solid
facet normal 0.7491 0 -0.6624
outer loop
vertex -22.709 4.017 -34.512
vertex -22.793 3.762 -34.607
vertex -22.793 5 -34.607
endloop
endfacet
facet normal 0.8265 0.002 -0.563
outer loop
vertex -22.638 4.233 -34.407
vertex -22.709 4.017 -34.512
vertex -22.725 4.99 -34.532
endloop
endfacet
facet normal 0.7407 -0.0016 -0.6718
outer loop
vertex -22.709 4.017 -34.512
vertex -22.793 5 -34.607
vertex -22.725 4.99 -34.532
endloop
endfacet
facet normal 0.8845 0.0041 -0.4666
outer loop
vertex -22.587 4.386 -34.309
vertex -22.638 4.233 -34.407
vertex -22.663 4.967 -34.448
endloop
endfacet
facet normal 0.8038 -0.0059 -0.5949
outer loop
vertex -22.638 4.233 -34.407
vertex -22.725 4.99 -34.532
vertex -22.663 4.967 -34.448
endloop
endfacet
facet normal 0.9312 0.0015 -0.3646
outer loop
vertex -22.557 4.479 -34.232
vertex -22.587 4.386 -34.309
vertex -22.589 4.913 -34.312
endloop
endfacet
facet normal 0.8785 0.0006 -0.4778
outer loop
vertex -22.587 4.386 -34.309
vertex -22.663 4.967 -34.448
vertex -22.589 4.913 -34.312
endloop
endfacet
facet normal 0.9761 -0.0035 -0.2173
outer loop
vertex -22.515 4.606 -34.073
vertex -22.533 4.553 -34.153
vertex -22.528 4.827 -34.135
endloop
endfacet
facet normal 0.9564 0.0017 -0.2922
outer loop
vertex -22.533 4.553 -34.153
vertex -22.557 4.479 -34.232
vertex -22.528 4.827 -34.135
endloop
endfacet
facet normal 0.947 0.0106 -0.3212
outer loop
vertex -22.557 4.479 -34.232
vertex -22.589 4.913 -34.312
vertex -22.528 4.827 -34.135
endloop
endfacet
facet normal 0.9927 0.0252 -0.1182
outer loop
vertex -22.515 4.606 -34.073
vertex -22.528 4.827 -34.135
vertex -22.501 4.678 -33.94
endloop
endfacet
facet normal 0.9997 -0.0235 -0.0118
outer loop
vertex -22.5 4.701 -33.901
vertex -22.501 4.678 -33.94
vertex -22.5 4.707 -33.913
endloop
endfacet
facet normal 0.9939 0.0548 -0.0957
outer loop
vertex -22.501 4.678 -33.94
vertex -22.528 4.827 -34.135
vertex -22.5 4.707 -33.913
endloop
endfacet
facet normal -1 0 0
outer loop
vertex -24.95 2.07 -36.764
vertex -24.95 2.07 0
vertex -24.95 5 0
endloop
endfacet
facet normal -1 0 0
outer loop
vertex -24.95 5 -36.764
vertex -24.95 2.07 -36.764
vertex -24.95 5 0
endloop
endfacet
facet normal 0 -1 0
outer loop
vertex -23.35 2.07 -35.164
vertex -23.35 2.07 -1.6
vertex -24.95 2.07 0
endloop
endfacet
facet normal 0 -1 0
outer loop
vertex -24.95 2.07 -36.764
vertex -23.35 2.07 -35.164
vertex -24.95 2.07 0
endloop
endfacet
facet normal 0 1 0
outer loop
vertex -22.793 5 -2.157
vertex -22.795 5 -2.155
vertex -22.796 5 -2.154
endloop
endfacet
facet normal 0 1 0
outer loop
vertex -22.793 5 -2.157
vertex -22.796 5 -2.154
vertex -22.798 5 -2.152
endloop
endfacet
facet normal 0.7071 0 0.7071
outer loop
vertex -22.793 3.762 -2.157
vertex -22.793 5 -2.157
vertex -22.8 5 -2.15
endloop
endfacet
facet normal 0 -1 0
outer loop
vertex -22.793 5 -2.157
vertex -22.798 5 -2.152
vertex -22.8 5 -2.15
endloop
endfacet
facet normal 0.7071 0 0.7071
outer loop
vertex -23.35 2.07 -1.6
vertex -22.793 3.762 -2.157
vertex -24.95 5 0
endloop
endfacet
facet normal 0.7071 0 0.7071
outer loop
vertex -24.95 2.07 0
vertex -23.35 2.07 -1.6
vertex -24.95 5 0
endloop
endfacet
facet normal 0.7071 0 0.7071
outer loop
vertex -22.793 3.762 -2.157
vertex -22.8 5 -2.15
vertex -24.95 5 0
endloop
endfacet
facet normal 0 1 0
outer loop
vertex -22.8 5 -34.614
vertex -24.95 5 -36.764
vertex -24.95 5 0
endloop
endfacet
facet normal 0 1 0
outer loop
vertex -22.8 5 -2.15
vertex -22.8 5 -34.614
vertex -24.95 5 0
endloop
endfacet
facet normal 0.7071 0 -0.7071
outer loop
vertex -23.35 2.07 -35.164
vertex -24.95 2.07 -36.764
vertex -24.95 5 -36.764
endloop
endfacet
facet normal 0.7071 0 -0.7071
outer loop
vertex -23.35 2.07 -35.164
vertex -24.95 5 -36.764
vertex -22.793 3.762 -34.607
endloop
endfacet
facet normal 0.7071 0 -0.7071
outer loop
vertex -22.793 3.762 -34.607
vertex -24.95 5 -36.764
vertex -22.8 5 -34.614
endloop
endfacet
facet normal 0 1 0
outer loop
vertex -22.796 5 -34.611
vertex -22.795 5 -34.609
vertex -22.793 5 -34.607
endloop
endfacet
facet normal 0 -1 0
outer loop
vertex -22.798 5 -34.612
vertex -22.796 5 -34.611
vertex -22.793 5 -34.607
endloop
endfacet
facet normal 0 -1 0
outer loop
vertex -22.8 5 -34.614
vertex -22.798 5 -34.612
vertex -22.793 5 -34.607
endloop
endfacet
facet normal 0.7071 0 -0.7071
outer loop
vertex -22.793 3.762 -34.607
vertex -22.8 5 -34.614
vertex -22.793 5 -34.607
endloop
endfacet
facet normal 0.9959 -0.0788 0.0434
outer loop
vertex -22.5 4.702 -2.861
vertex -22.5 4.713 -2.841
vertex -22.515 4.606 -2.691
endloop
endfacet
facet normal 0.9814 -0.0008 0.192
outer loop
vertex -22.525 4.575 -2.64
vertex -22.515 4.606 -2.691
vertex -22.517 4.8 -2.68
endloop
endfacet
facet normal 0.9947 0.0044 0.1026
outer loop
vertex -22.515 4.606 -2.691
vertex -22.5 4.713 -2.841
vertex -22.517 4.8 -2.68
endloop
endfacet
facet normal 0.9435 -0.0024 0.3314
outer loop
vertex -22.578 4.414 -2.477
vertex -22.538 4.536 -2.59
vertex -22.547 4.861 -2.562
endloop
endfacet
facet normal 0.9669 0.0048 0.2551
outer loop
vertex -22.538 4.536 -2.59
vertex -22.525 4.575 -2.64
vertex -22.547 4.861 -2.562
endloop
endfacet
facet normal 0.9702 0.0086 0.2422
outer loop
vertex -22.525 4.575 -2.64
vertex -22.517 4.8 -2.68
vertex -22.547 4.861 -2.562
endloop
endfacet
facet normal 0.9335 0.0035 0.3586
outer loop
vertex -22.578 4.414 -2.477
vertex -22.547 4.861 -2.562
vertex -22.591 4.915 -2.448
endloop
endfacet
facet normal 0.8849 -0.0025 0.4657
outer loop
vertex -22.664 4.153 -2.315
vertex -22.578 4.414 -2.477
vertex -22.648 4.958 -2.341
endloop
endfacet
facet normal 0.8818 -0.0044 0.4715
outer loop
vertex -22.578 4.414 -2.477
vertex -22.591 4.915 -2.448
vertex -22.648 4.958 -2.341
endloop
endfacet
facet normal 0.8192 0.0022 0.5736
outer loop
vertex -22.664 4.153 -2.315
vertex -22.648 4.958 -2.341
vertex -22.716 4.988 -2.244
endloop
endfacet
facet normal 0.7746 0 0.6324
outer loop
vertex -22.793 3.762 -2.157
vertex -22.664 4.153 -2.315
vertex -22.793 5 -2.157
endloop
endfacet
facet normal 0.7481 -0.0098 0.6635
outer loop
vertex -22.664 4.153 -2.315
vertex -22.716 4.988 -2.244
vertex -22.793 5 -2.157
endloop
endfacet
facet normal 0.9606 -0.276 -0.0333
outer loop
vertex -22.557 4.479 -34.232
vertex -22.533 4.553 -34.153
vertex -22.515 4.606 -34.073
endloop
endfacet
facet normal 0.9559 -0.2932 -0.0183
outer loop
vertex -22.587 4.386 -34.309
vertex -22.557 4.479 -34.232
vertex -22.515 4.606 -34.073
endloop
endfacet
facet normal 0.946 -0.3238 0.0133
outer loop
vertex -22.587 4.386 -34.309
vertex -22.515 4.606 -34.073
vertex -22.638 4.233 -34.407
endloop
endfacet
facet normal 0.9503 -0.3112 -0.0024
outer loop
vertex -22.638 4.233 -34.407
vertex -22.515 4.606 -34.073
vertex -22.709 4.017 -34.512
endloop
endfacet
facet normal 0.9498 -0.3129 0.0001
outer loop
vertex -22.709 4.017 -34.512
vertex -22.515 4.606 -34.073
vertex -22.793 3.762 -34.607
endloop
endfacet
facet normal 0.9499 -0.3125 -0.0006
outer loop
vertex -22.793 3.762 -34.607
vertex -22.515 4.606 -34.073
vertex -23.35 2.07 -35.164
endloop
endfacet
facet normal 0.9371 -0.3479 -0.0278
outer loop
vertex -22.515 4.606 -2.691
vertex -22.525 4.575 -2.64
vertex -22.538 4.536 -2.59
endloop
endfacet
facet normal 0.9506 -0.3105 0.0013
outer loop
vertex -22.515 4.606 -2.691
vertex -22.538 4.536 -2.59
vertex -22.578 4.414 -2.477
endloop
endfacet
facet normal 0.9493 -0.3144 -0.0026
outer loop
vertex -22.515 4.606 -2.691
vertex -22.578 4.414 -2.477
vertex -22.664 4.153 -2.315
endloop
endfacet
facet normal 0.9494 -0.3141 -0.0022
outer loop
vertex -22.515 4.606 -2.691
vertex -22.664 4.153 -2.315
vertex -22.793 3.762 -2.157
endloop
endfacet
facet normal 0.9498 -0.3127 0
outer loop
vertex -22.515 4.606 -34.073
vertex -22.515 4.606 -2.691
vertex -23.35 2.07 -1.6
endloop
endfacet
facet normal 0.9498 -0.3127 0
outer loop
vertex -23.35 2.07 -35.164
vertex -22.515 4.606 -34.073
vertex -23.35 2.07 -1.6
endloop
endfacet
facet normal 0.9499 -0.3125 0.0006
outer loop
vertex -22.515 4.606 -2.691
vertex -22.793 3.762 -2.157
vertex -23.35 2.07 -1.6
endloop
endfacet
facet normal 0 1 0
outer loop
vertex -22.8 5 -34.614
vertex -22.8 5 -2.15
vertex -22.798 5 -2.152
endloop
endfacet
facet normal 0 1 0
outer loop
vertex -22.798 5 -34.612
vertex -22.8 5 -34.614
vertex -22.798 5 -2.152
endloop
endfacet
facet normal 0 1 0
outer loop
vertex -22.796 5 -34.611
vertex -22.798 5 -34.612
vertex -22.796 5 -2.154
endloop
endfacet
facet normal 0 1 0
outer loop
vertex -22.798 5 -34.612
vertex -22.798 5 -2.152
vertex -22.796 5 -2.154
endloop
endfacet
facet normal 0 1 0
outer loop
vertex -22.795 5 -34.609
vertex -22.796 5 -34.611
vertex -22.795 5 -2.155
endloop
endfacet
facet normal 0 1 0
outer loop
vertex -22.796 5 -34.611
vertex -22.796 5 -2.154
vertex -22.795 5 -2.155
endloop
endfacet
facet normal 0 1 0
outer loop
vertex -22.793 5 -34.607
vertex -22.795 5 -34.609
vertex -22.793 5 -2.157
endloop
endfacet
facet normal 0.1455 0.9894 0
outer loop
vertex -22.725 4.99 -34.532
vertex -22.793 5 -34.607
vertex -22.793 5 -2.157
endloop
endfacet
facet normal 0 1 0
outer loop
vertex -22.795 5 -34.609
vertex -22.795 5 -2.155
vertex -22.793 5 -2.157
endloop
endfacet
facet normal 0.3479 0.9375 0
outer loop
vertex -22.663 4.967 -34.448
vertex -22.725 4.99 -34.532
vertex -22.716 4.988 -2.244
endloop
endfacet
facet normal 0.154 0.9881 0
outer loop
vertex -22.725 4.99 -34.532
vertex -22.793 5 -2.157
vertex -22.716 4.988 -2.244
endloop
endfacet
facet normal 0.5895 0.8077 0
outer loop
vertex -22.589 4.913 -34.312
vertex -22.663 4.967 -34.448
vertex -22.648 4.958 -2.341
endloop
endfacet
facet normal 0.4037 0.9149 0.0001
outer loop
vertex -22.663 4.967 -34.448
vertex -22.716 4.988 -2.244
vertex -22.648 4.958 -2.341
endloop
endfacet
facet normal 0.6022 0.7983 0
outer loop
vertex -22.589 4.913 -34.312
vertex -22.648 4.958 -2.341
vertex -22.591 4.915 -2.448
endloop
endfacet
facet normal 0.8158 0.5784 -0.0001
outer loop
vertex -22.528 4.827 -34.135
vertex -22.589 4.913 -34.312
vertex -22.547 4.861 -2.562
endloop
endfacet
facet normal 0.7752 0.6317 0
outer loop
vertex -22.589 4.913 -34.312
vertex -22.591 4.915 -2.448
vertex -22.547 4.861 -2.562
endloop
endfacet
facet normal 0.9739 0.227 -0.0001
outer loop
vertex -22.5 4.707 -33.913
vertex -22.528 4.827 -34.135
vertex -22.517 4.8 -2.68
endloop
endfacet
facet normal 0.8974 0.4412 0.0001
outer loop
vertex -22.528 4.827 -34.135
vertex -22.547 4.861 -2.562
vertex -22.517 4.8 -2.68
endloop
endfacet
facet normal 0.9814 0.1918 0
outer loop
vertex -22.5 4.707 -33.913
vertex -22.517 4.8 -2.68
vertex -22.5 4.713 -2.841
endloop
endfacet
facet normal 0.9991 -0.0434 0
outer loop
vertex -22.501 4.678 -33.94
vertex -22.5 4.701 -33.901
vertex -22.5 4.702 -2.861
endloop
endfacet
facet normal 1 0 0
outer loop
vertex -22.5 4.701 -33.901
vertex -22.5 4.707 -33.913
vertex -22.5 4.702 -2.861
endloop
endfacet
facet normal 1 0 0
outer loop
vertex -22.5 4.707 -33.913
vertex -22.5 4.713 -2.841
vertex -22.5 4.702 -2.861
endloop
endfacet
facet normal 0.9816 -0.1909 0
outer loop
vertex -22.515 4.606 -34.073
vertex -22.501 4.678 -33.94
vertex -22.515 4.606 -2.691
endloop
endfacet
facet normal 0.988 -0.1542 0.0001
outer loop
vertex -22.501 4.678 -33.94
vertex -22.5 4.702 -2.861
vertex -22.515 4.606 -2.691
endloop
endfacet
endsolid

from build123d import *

# Parameters (mm, degrees)
SALIENTE_EXTRUIR1_DEPTH = 36.76416917
CORTAR_EXTRUIR1_REACH   = 46.527


with BuildPart() as part:
    # Croquis1 → Saliente-Extruir1 (new body)
    with BuildSketch(Plane.XY):
        with BuildLine():
            Line((-24.95, 2.07), (-24.95, 5))
            Line((-24.95, 5), (-22.8, 5))
            ThreePointArc((-22.8, 5), (-22.55695313, 4.875864205), (-22.515045035, 4.606188125))
            Line((-22.515045035, 4.606188125), (-23.35, 2.07))
            Line((-23.35, 2.07), (-24.95, 2.07))
        make_face()
    extrude(amount=-SALIENTE_EXTRUIR1_DEPTH)

    # Cortar-Extruir1: up to this face of the body (flat: up to its plane)
    cortar_extruir1_end = Plane(part.part.faces().sort_by_distance((-24.15, 2.07, -18.382084585))[0])
    # Croquis3 → Cortar-Extruir1 (cut, up to the picked face)
    with BuildSketch(Plane(origin=(0, 5, 0), x_dir=(1, 0, 0), z_dir=(0, 1, 0)), mode=Mode.PRIVATE) as cortar_extruir1_sk1:
        with BuildLine():
            Line((-24.95, 36.76416917), (-22.792893219, 34.607062389))
            ThreePointArc((-22.792893219, 34.607062389), (-22.576120467, 34.28263904), (-22.5, 33.899955608))
            Line((-22.5, 33.899955608), (-22.5, 2.864213562))
            ThreePointArc((-22.5, 2.864213562), (-22.576120467, 2.48153013), (-22.792893219, 2.157106781))
            Line((-22.792893219, 2.157106781), (-24.95, 0))
            Line((-24.95, 0), (-24.95, -1.353882683))
            Line((-24.95, -1.353882683), (-20.676224188, -1.353882683))
            Line((-20.676224188, -1.353882683), (-20.676224188, 38.571872723))
            Line((-20.676224188, 38.571872723), (-24.95, 38.571872723))
            Line((-24.95, 38.571872723), (-24.95, 36.76416917))
        make_face()
    cortar_extruir1_tool1 = split(extrude(cortar_extruir1_sk1.sketch, amount=-CORTAR_EXTRUIR1_REACH, mode=Mode.PRIVATE), bisect_by=cortar_extruir1_end, keep=Keep.BOTH, mode=Mode.PRIVATE)
    add(cortar_extruir1_tool1.solids().sort_by(Axis((-21.899514, 5, -18.829145), (0, -1, 0)))[0], mode=Mode.SUBTRACT)


solid = part.part
